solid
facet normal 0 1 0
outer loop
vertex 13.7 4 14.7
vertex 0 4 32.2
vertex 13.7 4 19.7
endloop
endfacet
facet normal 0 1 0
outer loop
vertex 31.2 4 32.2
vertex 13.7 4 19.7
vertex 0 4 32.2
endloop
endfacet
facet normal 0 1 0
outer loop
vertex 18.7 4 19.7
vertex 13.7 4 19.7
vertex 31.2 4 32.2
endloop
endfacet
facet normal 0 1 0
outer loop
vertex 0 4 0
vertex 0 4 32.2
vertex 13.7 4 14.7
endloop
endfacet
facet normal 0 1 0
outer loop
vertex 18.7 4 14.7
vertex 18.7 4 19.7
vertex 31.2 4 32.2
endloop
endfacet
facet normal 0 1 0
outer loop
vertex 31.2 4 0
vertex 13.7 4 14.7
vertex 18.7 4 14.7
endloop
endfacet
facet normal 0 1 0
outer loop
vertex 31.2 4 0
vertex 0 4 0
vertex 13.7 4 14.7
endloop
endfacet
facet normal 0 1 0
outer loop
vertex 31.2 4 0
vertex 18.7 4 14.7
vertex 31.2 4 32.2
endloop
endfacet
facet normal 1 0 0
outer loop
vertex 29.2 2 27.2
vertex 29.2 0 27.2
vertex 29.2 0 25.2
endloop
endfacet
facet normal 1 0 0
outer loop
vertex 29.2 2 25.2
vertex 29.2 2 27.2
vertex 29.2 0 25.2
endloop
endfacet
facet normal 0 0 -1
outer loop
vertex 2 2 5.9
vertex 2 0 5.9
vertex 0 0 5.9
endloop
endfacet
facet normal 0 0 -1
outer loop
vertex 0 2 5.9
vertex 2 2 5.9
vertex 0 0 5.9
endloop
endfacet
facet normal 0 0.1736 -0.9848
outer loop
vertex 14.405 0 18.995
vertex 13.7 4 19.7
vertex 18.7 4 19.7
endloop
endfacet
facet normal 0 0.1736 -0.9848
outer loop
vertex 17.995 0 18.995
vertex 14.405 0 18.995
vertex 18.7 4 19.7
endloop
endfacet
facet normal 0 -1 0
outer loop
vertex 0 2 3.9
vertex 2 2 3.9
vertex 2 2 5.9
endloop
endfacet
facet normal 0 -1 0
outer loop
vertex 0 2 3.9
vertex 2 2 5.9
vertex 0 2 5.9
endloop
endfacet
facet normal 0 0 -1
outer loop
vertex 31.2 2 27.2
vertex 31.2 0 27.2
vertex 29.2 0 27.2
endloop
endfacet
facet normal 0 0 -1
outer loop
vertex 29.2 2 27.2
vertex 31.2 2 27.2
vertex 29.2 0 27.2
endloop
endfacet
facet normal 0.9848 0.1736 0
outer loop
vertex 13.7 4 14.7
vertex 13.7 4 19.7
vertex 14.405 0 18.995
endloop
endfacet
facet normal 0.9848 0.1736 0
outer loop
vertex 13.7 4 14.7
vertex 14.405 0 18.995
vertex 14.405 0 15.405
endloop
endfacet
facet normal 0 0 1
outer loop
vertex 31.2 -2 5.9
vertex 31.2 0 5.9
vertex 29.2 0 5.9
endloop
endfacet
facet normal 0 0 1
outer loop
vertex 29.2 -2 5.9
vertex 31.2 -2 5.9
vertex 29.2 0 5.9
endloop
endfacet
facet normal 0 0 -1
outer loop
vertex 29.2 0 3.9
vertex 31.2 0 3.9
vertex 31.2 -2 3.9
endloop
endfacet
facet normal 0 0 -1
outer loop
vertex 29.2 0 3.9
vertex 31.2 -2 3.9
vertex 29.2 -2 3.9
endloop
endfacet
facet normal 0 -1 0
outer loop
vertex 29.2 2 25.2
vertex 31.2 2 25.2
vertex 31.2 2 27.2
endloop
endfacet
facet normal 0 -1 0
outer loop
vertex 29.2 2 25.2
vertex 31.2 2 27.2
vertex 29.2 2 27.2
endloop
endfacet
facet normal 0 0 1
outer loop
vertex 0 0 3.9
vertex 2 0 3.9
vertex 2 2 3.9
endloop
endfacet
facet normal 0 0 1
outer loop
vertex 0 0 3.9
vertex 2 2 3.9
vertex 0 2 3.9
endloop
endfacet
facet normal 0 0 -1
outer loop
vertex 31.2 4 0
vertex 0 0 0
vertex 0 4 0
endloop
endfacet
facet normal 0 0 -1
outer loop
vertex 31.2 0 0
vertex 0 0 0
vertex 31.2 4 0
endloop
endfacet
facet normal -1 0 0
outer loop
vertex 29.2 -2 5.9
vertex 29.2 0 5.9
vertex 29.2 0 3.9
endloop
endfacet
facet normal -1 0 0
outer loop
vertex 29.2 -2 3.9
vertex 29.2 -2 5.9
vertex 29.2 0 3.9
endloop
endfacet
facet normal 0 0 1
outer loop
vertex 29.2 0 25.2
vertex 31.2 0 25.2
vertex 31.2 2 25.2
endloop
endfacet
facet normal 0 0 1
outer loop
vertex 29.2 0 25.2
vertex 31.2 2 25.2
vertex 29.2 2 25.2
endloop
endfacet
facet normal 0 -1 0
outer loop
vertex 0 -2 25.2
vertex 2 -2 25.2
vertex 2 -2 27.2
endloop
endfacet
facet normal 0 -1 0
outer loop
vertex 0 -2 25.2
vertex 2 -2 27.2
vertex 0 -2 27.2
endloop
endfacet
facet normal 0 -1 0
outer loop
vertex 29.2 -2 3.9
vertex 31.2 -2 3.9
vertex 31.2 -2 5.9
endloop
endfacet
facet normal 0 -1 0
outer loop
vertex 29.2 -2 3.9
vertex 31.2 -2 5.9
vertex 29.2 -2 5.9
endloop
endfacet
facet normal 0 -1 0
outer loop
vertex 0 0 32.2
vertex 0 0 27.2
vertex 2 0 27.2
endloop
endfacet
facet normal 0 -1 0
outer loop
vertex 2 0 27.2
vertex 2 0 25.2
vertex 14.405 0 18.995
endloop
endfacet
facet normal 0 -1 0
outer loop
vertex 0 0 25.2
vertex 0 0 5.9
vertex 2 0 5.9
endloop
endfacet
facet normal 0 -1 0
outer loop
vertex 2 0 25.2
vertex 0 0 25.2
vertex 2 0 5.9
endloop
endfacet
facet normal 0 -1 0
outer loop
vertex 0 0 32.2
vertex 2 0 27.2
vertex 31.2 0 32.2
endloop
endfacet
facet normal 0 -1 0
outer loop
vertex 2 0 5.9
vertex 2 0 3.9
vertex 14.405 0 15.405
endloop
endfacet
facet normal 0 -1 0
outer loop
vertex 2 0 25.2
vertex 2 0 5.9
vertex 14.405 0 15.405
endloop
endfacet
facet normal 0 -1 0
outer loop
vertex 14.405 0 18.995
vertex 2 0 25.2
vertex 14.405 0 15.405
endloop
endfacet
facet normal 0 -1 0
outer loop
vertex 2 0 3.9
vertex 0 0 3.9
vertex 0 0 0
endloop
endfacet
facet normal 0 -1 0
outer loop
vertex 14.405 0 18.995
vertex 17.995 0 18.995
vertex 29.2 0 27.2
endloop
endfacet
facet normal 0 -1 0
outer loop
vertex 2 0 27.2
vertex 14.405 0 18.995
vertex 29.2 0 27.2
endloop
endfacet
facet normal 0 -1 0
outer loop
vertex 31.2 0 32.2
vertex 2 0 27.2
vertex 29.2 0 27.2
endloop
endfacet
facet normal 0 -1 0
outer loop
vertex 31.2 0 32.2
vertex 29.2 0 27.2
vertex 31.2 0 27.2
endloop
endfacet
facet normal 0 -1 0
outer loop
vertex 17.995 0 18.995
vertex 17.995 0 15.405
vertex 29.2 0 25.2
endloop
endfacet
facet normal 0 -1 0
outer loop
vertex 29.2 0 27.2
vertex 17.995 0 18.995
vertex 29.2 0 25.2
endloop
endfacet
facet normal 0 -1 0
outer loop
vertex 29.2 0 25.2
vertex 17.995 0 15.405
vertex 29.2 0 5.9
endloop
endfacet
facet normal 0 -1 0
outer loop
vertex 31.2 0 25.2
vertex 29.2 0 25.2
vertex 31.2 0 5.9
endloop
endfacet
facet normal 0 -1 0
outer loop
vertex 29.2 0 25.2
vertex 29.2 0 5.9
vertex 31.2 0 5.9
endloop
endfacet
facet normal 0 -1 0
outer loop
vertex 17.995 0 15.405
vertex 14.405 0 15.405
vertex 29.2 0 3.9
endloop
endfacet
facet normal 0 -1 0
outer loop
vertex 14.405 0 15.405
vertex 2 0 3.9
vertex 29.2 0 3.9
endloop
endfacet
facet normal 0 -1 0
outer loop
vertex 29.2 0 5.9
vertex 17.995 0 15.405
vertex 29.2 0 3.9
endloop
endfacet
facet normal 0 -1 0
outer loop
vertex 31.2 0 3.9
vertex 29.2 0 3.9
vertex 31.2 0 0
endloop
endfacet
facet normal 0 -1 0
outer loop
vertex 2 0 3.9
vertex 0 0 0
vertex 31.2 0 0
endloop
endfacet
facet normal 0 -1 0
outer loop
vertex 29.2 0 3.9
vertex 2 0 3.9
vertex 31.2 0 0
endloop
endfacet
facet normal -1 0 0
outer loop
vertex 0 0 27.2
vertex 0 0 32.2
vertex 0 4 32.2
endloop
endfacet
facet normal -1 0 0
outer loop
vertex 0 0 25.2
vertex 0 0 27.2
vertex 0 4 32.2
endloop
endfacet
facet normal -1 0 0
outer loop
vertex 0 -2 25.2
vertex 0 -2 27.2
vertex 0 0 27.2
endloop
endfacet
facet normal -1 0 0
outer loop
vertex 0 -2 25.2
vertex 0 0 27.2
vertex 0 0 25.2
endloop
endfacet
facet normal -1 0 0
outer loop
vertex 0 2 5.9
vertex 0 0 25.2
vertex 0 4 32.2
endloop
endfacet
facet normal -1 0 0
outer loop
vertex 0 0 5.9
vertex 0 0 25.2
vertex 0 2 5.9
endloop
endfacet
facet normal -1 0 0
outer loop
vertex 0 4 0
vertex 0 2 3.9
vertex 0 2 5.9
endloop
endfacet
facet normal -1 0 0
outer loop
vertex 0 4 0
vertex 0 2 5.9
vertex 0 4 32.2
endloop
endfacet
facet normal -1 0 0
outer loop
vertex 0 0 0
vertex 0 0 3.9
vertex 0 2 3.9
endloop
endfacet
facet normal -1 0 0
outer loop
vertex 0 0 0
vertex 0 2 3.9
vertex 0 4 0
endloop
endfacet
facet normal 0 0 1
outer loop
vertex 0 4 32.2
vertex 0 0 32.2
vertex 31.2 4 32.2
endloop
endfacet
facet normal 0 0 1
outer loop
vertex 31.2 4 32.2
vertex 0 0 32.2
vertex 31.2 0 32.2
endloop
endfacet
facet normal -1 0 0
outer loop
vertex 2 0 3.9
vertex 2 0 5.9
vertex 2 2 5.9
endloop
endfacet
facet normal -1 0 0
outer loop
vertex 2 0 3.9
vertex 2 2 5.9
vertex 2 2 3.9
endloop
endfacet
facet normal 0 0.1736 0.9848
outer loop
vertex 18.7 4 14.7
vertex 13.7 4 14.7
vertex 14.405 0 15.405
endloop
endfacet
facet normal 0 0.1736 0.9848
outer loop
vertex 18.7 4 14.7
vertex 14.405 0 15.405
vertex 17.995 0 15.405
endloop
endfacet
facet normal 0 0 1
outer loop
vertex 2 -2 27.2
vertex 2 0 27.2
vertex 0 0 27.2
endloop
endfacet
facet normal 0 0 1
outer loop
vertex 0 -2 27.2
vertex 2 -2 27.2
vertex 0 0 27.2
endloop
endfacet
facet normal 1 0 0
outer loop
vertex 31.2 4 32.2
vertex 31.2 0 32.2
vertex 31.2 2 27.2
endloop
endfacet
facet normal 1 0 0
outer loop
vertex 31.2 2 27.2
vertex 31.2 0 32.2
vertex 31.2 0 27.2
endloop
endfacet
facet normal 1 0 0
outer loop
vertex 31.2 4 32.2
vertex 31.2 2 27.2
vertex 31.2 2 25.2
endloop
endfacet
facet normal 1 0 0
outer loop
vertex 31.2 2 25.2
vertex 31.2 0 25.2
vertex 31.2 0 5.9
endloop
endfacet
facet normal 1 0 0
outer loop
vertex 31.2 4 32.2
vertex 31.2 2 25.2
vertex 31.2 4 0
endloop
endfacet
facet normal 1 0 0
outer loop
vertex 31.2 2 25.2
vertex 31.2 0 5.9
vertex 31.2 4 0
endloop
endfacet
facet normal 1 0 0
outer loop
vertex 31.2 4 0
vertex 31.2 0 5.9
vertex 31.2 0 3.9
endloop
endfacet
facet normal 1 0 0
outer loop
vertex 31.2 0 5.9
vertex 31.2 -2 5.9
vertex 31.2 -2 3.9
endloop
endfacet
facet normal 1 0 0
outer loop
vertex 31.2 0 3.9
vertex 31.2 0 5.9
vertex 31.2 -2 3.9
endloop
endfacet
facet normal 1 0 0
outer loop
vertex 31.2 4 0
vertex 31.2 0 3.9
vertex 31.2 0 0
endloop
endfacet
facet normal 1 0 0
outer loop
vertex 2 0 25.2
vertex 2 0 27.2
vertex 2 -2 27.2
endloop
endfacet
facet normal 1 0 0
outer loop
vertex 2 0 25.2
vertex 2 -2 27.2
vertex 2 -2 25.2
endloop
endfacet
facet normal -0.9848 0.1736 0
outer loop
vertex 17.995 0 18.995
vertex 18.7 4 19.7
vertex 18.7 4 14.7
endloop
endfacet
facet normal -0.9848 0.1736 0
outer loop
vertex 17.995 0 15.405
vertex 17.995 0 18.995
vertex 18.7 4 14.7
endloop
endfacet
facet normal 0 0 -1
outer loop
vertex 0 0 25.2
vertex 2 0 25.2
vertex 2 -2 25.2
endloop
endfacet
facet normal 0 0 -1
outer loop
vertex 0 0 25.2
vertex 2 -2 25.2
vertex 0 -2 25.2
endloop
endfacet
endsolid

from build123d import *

# Parameters (mm, degrees)
SKETCH1_W          = 31.2
SKETCH1_H          = 32.2
BODY_DEPTH         = 4
SKETCH2_W          = 2
SKETCH2_H          = 2
FEMALE_TABS_DEPTH  = 2
SKETCH3_W          = 2
SKETCH3_H          = 2
MALE_TABS_DEPTH    = 2
SKETCH4_W          = 5
SKETCH4_H          = 5
CUT_EXTRUDE2_DEPTH = 4
CUT_EXTRUDE2_DRAFT = -10


with BuildPart() as part:
    # Sketch1 → Body (new body)
    with BuildSketch(Plane(origin=(0, 0, 0), x_dir=(1, 0, 0), z_dir=(0, 1, 0))):
        with Locations((15.6, -16.1)):
            Rectangle(SKETCH1_W, SKETCH1_H)
    extrude(amount=BODY_DEPTH)

    # Sketch2 → Female Tabs (cut)
    with BuildSketch(Plane(origin=(0, 0, 0), x_dir=(-1, 0, 0), z_dir=(0, -1, 0))):
        with Locations((-1, -4.9)):
            Rectangle(SKETCH2_W, SKETCH2_H)
        with Locations((-30.2, -26.2)):
            Rectangle(SKETCH2_W, SKETCH2_H)
    extrude(amount=-FEMALE_TABS_DEPTH, mode=Mode.SUBTRACT)

    # Sketch3 → Male Tabs (add)
    with BuildSketch(Plane(origin=(0, 0, 0), x_dir=(-1, 0, 0), z_dir=(0, -1, 0))):
        with Locations((-1, -26.2)):
            Rectangle(SKETCH3_W, SKETCH3_H)
        with Locations((-30.2, -4.9)):
            Rectangle(SKETCH3_W, SKETCH3_H)
    extrude(amount=MALE_TABS_DEPTH)


with BuildPart() as cut_extrude2_tool:
    # Sketch4 → Cut-Extrude2 (with draft: the straight prism first)
    with BuildSketch(Plane(origin=(0, 4, 0), x_dir=(1, 0, 0), z_dir=(0, 1, 0))):
        with Locations((16.2, -17.2)):
            Rectangle(SKETCH4_W, SKETCH4_H)
    extrude(amount=-CUT_EXTRUDE2_DEPTH)
    # Cut-Extrude2: the draft: its side faces are tilted about the plane it starts from
    cut_extrude2_sides = [cut_extrude2_tool.faces().sort_by_distance(p)[0] for p in [
        (18.7, 2, 17.2),
        (16.2, 2, 14.7),
        (13.7, 2, 17.2),
        (16.2, 2, 19.7),
    ]]
    draft(cut_extrude2_sides, Plane(origin=(0, 4, 0), x_dir=(1, 0, 0), z_dir=(0, 1, 0)), CUT_EXTRUDE2_DRAFT)


with BuildPart() as part_1:
    add(part.part)

    # Cut-Extrude2: cut by cut_extrude2_tool
    add(cut_extrude2_tool.part, mode=Mode.SUBTRACT)


solid = part_1.part
